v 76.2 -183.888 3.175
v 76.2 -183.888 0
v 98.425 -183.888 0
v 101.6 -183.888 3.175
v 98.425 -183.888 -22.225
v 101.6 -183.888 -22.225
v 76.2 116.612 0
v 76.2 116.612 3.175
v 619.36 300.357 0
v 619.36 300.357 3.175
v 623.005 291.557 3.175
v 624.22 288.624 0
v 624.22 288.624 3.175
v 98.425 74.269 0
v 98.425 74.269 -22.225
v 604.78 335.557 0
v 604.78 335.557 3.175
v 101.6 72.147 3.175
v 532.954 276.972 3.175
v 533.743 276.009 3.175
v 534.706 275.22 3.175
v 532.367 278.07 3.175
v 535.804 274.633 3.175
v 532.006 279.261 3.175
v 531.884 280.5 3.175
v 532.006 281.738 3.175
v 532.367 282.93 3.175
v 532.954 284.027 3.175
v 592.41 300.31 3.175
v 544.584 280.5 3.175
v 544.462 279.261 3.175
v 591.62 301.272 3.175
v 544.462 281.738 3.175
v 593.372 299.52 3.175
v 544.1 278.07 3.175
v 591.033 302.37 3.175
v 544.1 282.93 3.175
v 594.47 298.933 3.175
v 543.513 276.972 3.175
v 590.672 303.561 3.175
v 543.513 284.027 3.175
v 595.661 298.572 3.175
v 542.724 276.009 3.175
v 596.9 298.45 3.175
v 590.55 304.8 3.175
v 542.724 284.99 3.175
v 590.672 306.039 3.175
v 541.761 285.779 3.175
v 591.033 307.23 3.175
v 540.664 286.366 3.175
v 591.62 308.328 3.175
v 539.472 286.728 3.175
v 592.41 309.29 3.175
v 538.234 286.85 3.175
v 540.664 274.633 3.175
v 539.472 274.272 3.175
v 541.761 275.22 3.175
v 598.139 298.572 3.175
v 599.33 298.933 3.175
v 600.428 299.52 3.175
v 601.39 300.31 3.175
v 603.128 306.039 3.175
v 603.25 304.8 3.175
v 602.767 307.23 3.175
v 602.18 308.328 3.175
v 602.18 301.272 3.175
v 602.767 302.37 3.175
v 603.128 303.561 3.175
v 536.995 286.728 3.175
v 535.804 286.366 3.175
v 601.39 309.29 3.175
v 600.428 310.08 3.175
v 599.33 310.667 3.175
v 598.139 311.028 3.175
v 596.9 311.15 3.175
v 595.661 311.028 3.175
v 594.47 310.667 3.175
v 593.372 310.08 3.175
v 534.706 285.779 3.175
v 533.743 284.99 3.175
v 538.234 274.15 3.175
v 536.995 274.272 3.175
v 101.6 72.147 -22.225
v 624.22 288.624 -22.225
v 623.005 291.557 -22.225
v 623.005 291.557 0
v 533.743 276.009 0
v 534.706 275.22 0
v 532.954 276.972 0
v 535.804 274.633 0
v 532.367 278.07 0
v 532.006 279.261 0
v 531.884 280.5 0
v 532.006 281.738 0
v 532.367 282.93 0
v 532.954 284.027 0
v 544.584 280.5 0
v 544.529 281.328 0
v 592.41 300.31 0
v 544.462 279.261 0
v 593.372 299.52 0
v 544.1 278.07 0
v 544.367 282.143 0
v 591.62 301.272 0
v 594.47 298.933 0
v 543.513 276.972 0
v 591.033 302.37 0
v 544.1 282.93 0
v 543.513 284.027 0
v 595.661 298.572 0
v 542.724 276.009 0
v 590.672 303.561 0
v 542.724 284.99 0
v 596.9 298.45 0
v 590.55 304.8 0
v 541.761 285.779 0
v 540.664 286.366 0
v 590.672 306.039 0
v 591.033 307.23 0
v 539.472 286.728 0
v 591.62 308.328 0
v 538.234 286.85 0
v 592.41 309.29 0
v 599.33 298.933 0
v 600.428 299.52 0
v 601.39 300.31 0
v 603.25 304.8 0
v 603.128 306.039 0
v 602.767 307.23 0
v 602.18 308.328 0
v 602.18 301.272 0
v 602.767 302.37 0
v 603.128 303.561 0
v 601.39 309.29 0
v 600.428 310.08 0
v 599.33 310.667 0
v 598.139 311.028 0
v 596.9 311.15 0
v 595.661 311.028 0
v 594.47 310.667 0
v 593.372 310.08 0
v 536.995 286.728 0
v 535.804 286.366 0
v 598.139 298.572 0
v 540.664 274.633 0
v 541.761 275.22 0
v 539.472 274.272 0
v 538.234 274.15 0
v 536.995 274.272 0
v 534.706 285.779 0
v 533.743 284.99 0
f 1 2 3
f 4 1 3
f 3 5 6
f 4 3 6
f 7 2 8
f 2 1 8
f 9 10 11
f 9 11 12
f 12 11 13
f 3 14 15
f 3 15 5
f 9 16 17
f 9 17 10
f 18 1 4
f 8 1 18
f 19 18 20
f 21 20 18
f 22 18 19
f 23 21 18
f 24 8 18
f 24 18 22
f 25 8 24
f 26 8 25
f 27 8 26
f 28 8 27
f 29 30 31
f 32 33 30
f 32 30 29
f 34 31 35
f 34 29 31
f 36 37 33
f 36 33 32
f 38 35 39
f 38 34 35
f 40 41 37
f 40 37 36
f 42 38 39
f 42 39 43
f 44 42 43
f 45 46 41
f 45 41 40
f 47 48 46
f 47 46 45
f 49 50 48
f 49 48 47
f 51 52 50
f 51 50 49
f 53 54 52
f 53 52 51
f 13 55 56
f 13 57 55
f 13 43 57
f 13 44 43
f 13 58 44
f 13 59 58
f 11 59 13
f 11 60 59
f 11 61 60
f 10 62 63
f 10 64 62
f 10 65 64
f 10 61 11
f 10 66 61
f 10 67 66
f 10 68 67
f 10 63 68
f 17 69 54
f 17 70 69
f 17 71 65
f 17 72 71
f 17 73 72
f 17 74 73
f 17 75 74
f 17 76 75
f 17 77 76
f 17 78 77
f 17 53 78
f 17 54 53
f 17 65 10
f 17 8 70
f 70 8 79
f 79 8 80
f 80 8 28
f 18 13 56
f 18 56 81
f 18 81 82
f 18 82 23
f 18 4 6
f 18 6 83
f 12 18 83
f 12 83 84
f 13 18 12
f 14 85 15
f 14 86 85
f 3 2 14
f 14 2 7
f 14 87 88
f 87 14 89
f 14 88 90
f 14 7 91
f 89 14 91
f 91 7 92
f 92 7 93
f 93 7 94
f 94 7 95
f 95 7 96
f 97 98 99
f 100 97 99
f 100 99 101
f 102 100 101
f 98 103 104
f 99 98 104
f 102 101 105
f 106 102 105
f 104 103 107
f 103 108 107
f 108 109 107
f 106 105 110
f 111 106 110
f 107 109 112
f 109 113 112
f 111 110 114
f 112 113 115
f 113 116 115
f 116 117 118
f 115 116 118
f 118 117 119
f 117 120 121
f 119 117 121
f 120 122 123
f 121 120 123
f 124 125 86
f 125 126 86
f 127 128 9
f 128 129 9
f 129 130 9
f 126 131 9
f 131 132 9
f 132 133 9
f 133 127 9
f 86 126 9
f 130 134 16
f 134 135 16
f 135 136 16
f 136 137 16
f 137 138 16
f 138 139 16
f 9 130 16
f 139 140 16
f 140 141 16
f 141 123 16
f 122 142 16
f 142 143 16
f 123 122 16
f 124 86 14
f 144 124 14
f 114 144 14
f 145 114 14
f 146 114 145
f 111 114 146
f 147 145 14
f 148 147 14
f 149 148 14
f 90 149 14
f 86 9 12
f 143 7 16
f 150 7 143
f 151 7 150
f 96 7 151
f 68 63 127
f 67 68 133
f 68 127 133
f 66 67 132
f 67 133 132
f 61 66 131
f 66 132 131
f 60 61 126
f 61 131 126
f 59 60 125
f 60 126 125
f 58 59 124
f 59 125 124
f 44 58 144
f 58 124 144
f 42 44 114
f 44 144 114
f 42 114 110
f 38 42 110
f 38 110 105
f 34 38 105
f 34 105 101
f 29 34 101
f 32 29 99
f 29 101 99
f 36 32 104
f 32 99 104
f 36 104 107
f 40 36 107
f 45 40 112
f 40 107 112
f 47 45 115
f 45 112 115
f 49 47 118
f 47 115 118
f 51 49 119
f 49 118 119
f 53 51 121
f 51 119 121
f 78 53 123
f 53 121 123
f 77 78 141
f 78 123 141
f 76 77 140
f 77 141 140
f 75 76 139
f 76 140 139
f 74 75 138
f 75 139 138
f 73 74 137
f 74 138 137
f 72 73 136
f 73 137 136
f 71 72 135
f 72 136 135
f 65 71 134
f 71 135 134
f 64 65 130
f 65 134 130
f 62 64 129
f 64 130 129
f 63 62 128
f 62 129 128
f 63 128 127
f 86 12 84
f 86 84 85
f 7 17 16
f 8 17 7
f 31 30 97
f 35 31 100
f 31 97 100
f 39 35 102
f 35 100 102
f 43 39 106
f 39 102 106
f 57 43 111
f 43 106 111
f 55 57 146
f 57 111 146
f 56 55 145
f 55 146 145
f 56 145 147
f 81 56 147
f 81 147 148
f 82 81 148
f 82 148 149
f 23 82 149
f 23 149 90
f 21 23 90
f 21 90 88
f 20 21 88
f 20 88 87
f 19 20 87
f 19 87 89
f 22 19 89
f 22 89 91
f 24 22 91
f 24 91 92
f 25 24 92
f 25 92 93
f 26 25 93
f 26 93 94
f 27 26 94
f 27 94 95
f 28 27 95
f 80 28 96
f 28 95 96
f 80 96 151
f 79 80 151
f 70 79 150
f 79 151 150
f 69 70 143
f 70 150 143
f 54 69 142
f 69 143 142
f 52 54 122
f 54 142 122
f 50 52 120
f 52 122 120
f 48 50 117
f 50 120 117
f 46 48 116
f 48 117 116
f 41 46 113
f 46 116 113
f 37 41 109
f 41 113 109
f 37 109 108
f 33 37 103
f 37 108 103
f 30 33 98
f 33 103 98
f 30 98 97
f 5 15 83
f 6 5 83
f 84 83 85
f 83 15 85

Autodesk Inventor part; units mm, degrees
ref_plane "YZ Plane" through (0, 0, 0) normal (1, 0, 0) x (0, 1, 0)
ref_plane "XZ Plane" through (0, 0, 0) normal (0, 1, 0) x (-1, 0, 0)
ref_plane "Work Plane1" through (0, 0, 0) normal (0, 0, 1) x (1, 0, 0)
sketch "Sketch1" plane through (0, 0, 0) normal (0, 0, 1) x (1, 0, 0)
  line L0 (0, 0) -> (63.5, 0)
  line L1 (63.5, 0) -> (63.5, 482.6)
  line L2 (63.5, 482.6) -> (0, 482.6)
  line L3 (0, 482.6) -> (0, 0)
  line L4 (63.5, 482.6) -> (63.5, 406.4)
  line L5 (63.5, 482.6) -> (139.7, 482.6) construction
  line L6 (63.5, 406.4) -> (-63.5, 406.4)
  line L7 (63.5, 406.4) -> (63.5, 304.8)
  line L8 (63.5, 406.4) -> (165.1, 406.4) construction
  line L9 (63.5, 304.8) -> (1409.7, 304.8)
  line L10 (63.5, 304.8) -> (596.9, 304.8)
  circle A0 centre (596.9, 304.8) radius 88.9
  circle A1 centre (596.9, 304.8) radius 6.35
  line L11 (596.9, 304.8) -> (1174.248, 304.8) construction
  line L12 (596.9, 304.8) -> (538.2336, 280.4996)
  circle A2 centre (538.2336, 280.4996) radius 6.35
  line L13 (596.9, 304.8) -> (614.4999, 312.0901)
  line L14 (596.9, 304.8) -> (615.95, 304.8) construction
  line L15 (614.4999, 312.0901) -> (619.36, 300.3568)
  line L16 (619.36, 300.3568) -> (63.5, 70.1121)
  line L17 (614.4999, 312.0901) -> (609.6398, 323.8234)
  line L18 (614.4999, 312.0901) -> (627.1999, 312.0901) construction
  line L19 (609.6398, 323.8234) -> (63.5, 97.6049)
  line L20 (63.5, 70.1121) -> (63.5, -183.8879)
  line L21 (63.5, 70.1121) -> (317.5, 70.1121) construction
  line L22 (63.5, -183.8879) -> (88.9, -183.8879)
  line L23 (88.9, -183.8879) -> (88.9, 80.6331)
  dimension "d0" = 63.5
  dimension "d1" = 482.6
  dimension "d2" = 76.2
  dimension "d3" = 90
  dimension "d4" = 127
  dimension "d5" = 90
  dimension "d6" = 101.6
  dimension "d7" = 90
  dimension "d8" = 1346.2
  dimension "d9" = 90
  dimension "d10" = 533.4
  dimension "d11" = 177.8
  dimension "d12" = 12.7
  dimension "d14" = 63.5
  dimension "d15" = 12.7
  dimension "d16" = 19.05
  dimension "d17" = 22.5
  dimension "d18" = 12.7
  dimension "d19" = 90
  dimension "d20" = 90
  dimension "d21" = 12.7
  dimension "d22" = 112.5
  dimension "d23" = 591.1375
  dimension "d24" = 90
  dimension "d25" = 254
  dimension "d26" = 90
  dimension "d27" = 25.4
  dimension "d28" = 90
  dimension "d29" = 90
extrude "Extrusion1" add sketch "Sketch1" along normal blind 25.4 contours L1 L16 L23 L22 L20 | L1 L19 A0 L16 | L19 L9 A1 L15 L16 A0 | L19 L17 L13 A1 L9 | L9 A1 L13 L15
sketch "Sketch2" plane through (0, 0, 25.4) normal (0, 0, 1) x (1, 0, 0)
  circle A0 centre (596.9, 304.8) radius 6.35 projected
  line L0 (88.9, 80.6331) -> (619.36, 300.3568) projected
  line L1 (619.36, 300.3568) -> (609.6398, 323.8234) projected
  line L2 (609.6398, 323.8234) -> (63.5, 97.6049) projected
  line L3 (63.5, 97.6049) -> (63.5, -183.8879) projected
  line L4 (63.5, -183.8879) -> (88.9, -183.8879) projected
  line L5 (88.9, -183.8879) -> (88.9, 80.6331) projected
  line L6 (596.9, 304.8) -> (614.4999, 312.0901)
  line L7 (596.9, 304.8) -> (615.95, 304.8) construction
  line L8 (614.4999, 312.0901) -> (604.7797, 335.5567)
  line L9 (614.4999, 312.0901) -> (639.8999, 312.0901) construction
  line L10 (604.7797, 335.5567) -> (624.2201, 288.6236)
  line L11 (624.2201, 288.6236) -> (1203.6463, 288.6236) construction
  line L12 (604.7797, 335.5567) -> (1190.6567, 335.5567) construction
  line L13 (76.2, -183.8879) -> (101.6, -183.8879)
  line L14 (101.6, -183.8879) -> (50.8, -183.8879)
  line L15 (101.6, -183.8879) -> (101.6, 72.1473)
  line L16 (101.6, 72.1473) -> (624.2201, 288.6236)
  line L17 (604.7797, 335.5567) -> (50.8, 106.0907)
  line L18 (604.7797, 335.5567) -> (1204.4031, 335.5567) construction
  line L19 (50.8, 106.0907) -> (50.8, -183.8879)
  point P0 (0, 0)
  dimension "d32" = 22.5
  dimension "d33" = 25.4
  dimension "d34" = 112.5
  dimension "d35" = 50.8
  dimension "d36" = 0
  dimension "d39" = 25.4
  dimension "d40" = 50.8
  dimension "d42" = 157.5
extrude "Extrusion2" add sketch "Sketch2" against normal blind 25.4 contours L10 L16 L15 L13 L5 L0 | L2 L3 L14 L19 L17 L8
sketch "Sketch4" plane through (0, 0, 25.4) normal (0, 0, 1) x (1, 0, 0)
  line L0 (604.7797, 335.5567) -> (50.8, 106.0907) projected
  line L1 (50.8, 106.0907) -> (50.8, -183.8879) projected
  line L2 (50.8, -183.8879) -> (101.6, -183.8879) projected
  line L3 (101.6, -183.8879) -> (101.6, 72.1473) projected
  line L4 (76.2, -183.8879) -> (76.2, 116.6118)
  point P0 (0, 0)
extrude "Extrusion3" cut sketch "Sketch4" against normal blind 25.4
sketch "Sketch5" plane through (0, 0, 25.4) normal (0, 0, 1) x (1, 0, 0)
  line L0 (76.2, 116.6118) -> (76.2, -183.8879) projected
  line L1 (76.2, -183.8879) -> (101.6, -183.8879) projected
  line L2 (101.6, -183.8879) -> (101.6, 72.1473) projected
  line L3 (101.6, 72.1473) -> (624.2201, 288.6236) projected
  line L4 (624.2201, 288.6236) -> (604.7797, 335.5567) projected
  line L5 (604.7797, 335.5567) -> (76.2, 116.6118) projected
  circle A0 centre (538.2336, 280.4996) radius 6.35 projected
  circle A1 centre (596.9, 304.8) radius 6.35 projected
  line L6 (101.6, -183.8879) -> (98.425, -183.8879)
  line L7 (101.6, -183.8879) -> (104.775, -183.8879) construction
  line L8 (624.2201, 288.6236) -> (623.005, 291.5569)
  line L9 (624.2201, 288.6236) -> (627.3951, 288.6236) construction
  line L10 (623.005, 291.5569) -> (98.425, 74.2687)
  line L11 (98.425, 74.2687) -> (98.425, -183.8879)
  point P0 (0, 0)
  dimension "d61" = 3.175
  dimension "d62" = 180
  dimension "d63" = 3.175
  dimension "d64" = 112.5
  dimension "d65" = 90
extrude "Extrusion4" cut sketch "Sketch5" against normal blind 22.225 contours L5 L4 L10 L11 L1 L0
sketch "Sketch6" plane through (0, 0, 25.4) normal (0, 0, 1) x (1, 0, 0)
  line L0 (623.005, 291.5569) -> (98.425, 74.2687) projected
  line L1 (98.425, 74.2687) -> (98.425, -183.8879) projected
  line L2 (98.425, -183.8879) -> (101.6, -183.8879) projected
  line L3 (101.6, -183.8879) -> (101.6, 72.1473) projected
  line L4 (101.6, 72.1473) -> (624.2201, 288.6236) projected
  line L5 (624.2201, 288.6236) -> (623.005, 291.5569) projected
  point P0 (0, 0)
extrude "Extrusion5" add sketch "Sketch6" against normal blind 47.625
sketch "Sketch7" plane through (0, 0, 25.4) normal (0, 0, 1) x (1, 0, 0)
  line L0 (623.005, 291.5569) -> (98.425, 74.2687) projected
  line L1 (98.425, 74.2687) -> (98.425, -183.8879) projected
  line L2 (98.425, -183.8879) -> (101.6, -183.8879) projected
  line L3 (101.6, -183.8879) -> (101.6, 72.1473) projected
  line L4 (101.6, 72.1473) -> (624.2201, 288.6236) projected
  line L5 (624.2201, 288.6236) -> (623.005, 291.5569) projected
  point P0 (0, 0)
extrude "Extrusion6" cut sketch "Sketch7" against normal blind 22.225
properties part number "CatapultArmL-Left"
